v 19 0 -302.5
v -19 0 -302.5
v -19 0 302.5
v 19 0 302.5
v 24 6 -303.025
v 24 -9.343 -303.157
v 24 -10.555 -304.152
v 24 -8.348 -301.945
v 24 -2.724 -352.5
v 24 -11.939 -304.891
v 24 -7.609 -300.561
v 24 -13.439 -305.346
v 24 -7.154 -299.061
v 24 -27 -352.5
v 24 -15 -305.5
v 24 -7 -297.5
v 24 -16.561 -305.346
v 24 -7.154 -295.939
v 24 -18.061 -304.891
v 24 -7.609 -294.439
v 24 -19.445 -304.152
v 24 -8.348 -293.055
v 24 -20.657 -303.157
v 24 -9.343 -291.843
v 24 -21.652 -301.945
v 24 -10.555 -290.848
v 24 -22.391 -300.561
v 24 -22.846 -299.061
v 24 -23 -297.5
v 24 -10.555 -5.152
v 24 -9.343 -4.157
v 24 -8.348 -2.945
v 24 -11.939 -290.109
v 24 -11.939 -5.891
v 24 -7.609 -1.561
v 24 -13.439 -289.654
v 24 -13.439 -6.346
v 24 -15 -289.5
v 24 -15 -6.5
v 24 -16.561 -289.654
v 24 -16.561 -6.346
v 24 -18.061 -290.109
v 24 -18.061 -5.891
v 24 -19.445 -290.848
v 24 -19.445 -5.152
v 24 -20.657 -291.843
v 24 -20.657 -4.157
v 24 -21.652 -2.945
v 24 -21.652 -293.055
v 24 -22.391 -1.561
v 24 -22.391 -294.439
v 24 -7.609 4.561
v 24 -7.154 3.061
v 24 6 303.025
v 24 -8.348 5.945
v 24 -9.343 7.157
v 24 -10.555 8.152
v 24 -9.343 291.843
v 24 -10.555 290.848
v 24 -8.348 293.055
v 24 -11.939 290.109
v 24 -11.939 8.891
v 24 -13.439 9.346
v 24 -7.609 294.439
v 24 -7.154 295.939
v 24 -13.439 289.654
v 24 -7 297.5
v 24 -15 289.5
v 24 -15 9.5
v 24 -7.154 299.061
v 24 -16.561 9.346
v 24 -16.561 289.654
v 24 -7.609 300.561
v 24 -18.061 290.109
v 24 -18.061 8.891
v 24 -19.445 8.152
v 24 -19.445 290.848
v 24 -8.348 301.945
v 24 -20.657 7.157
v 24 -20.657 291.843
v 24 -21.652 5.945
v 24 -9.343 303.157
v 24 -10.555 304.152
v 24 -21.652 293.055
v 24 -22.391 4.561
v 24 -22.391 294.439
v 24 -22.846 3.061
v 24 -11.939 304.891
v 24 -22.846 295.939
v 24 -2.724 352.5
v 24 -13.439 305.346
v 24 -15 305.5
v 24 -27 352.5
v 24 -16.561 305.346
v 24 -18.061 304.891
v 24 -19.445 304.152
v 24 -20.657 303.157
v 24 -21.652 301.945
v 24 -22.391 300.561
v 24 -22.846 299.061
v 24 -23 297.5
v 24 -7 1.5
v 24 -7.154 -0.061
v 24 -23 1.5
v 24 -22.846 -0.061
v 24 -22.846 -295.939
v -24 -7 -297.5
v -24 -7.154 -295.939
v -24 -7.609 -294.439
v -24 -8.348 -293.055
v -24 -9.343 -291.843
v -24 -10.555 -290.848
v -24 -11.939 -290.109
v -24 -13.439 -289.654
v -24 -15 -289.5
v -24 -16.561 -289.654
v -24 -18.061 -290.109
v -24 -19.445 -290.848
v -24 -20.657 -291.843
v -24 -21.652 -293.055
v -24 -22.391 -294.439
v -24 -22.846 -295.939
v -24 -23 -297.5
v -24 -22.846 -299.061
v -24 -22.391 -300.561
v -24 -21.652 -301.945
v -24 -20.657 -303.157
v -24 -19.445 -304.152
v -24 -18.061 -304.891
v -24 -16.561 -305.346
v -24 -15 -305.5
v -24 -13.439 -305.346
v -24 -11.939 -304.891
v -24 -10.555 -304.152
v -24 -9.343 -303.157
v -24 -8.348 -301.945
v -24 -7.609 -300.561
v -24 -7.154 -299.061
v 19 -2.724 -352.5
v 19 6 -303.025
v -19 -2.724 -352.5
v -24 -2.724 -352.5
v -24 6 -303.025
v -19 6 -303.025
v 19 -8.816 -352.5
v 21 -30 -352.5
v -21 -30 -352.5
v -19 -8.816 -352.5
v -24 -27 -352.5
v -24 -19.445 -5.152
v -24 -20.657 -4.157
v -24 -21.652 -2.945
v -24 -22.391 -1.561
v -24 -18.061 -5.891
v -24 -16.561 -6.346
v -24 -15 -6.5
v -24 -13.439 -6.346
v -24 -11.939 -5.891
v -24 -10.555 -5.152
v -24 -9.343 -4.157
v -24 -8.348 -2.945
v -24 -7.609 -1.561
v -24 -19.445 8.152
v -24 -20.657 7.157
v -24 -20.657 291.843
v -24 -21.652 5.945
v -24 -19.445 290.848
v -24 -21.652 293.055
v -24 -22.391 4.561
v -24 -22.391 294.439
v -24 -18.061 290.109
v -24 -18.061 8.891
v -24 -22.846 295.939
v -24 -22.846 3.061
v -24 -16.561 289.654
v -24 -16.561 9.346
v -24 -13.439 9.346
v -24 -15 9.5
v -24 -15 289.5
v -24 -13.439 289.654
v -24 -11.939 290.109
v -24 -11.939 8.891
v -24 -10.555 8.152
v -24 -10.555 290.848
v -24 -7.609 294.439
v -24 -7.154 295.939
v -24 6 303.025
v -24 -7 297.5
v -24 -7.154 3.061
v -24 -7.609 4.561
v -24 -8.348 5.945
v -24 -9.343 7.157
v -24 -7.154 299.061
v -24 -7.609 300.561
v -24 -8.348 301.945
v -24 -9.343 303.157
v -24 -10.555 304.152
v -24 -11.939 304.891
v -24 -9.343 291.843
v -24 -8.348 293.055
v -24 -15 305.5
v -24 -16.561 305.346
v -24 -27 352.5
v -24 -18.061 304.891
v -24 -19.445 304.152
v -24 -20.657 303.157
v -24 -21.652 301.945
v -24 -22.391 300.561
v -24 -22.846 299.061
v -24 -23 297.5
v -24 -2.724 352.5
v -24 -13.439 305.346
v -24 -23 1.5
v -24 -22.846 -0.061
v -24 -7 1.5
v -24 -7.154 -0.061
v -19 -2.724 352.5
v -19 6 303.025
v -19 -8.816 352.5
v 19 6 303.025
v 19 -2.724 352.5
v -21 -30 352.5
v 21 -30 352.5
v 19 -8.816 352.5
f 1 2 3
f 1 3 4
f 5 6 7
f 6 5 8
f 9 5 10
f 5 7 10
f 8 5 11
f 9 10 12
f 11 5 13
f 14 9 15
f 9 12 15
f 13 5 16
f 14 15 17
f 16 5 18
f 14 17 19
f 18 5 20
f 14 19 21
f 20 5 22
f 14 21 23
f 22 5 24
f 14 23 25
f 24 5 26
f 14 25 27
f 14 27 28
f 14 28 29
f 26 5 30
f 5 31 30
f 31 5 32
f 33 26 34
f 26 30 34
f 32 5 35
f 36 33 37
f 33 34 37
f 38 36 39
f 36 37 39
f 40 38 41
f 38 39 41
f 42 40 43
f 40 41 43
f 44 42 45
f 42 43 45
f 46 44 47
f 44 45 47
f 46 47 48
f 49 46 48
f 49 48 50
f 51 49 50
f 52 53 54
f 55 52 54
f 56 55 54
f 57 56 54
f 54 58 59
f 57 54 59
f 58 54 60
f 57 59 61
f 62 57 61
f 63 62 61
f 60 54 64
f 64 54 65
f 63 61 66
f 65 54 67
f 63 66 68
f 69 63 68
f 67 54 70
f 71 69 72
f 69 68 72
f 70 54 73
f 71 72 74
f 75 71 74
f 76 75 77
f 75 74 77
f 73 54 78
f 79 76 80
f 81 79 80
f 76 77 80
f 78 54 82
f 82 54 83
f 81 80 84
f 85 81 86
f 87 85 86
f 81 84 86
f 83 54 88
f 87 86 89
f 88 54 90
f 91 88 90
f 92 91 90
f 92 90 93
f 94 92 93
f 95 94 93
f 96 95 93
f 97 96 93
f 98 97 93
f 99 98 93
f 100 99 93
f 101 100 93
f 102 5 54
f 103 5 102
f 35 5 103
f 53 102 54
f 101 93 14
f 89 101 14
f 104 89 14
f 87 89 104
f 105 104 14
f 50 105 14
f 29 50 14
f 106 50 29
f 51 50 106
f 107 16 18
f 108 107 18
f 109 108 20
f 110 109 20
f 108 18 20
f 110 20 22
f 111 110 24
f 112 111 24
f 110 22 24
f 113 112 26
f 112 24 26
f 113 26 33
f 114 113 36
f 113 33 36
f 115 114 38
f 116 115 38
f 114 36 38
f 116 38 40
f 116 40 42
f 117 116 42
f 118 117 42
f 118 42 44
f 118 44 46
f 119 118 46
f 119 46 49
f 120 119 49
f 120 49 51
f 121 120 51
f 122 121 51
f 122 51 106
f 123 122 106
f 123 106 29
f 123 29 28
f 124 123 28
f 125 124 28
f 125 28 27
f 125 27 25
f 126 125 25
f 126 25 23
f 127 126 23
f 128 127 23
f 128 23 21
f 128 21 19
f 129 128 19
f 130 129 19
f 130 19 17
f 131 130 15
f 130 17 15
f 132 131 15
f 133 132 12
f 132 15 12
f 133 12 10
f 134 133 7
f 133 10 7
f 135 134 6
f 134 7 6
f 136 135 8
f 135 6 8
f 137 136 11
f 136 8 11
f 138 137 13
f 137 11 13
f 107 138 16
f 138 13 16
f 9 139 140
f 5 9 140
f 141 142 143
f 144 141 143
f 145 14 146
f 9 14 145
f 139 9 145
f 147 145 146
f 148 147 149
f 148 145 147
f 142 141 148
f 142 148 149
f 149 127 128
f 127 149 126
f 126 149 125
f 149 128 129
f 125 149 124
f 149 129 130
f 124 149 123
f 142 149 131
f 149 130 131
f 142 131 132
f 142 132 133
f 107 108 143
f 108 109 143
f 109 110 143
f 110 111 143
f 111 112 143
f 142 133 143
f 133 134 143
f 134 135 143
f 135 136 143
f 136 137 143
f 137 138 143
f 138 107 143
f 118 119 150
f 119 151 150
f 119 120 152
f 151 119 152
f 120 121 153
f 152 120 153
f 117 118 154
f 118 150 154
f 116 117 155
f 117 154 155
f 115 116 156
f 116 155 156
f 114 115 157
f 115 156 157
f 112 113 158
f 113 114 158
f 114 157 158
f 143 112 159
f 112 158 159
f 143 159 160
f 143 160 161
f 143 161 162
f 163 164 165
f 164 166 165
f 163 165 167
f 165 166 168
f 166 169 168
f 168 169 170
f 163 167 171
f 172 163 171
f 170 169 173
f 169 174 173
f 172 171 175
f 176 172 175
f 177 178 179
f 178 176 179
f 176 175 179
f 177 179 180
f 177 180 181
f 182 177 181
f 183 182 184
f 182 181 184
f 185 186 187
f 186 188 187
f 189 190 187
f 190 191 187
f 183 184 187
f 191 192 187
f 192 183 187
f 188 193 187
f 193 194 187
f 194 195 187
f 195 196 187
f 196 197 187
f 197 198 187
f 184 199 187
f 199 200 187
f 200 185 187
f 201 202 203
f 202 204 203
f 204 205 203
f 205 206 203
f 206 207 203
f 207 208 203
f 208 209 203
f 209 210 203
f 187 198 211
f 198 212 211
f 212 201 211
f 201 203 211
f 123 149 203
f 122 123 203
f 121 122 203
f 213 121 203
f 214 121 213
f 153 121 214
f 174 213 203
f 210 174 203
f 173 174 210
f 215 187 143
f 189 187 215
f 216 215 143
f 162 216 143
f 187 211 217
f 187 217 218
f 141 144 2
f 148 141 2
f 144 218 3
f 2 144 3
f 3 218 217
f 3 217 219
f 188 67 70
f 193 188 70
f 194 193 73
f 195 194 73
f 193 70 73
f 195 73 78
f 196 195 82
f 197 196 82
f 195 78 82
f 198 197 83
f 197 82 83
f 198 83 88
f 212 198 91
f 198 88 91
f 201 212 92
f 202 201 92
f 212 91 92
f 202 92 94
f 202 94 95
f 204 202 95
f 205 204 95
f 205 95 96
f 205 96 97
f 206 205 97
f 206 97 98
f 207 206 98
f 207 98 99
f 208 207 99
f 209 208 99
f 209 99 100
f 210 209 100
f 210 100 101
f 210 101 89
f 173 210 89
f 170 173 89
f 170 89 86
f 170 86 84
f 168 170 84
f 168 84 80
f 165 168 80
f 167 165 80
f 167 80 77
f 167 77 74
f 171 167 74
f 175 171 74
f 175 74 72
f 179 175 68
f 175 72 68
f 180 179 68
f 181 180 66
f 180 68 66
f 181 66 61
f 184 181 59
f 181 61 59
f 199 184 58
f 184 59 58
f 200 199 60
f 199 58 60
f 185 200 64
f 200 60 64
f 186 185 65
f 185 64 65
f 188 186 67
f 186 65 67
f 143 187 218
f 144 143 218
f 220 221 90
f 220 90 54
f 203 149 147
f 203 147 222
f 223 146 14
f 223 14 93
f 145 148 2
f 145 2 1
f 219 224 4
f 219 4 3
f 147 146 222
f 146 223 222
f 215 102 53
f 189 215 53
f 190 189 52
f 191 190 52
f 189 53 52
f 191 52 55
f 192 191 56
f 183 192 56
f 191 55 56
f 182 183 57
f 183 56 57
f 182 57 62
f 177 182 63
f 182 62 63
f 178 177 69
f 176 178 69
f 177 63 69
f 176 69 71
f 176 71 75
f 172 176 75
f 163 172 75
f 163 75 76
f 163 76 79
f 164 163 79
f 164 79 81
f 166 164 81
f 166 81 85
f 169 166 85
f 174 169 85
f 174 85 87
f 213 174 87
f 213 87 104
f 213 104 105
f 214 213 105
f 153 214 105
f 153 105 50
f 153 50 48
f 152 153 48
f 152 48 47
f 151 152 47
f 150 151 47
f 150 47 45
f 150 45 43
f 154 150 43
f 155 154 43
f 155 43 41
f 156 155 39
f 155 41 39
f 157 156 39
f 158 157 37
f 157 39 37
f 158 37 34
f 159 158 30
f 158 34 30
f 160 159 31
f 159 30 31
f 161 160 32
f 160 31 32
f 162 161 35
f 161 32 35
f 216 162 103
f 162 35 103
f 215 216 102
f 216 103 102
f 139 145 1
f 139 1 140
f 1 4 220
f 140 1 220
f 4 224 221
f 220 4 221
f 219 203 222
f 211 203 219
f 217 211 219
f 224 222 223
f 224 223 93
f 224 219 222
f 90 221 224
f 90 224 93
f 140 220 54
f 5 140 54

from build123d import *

# Parameters (mm, degrees)
RESSALTO_EXTRUS_O1_DEPTH = 327.5
ESBO_O2_R                = 8
CORTE_EXTRUS_O1_DEPTH    = 655
RESSALTO_EXTRUS_O2_DEPTH = 25
RESSALTO_EXTRUS_O3_DEPTH = 25
CHANFRO1_SIZE            = 50
CHANFRO1_SIZE2           = 8.816349035
CORTE_EXTRUS_O2_START    = -48
CORTE_EXTRUS_O2_DEPTH    = 48
CHANFRO2_SIZE            = 3


with BuildPart() as part:
    # Esboço1 → Ressalto-extrusão1 (new, symmetric)
    with BuildSketch(Plane.XY):
        Polygon((-19, 0), (19, 0), (19, 6), (24, 6), (24, -30), (-24, -30), (-24, 6), (-19, 6), align=None)
    extrude(amount=RESSALTO_EXTRUS_O1_DEPTH, both=True)

    # Esboço2 → Corte-extrusão1 (cut)
    with BuildSketch(Plane(origin=(24, 0, 0), x_dir=(0, 0, -1), z_dir=(1, 0, 0))):
        with Locations(Location((-297.5, -15, 0), (0, 0, 90))):
            Circle(ESBO_O2_R)
        with Locations(Location((297.5, -15, 0), (0, 0, 90))):
            Circle(ESBO_O2_R)
        with Locations(Location((-1.5, -15, 0), (0, 0, 90))):
            Circle(ESBO_O2_R)
    extrude(amount=-CORTE_EXTRUS_O1_DEPTH, mode=Mode.SUBTRACT)

    # Esboço3 → Ressalto-extrusão2 (add)
    with BuildSketch(Plane.XY.offset(327.5)):
        Polygon((-24, 6), (-24, -30), (24, -30), (24, 6), (19, 6), (19, 0), (-19, 0), (-19, 6), align=None)
    extrude(amount=RESSALTO_EXTRUS_O2_DEPTH)

    # Esboço4 → Ressalto-extrusão3 (add)
    with BuildSketch(Plane(origin=(0, 0, -327.5), x_dir=(-1, 0, 0), z_dir=(0, 0, -1))):
        Polygon((24, -30), (24, 6), (19, 6), (19, 0), (-19, 0), (-19, 6), (-24, 6), (-24, -30), align=None)
    extrude(amount=RESSALTO_EXTRUS_O3_DEPTH)

    # Chanfro1
    chanfro1_edges = [part.edges().sort_by_distance(p)[0] for p in [
        (0, 0, 352.5),
        (0, 0, -352.5),
    ]]
    chanfro1_side = [part.faces().sort_by_distance(p)[0] for p in [
        (0, 0, 0),
    ]]
    chamfer(chanfro1_edges, length=CHANFRO1_SIZE, length2=CHANFRO1_SIZE2, reference=chanfro1_side[0])

    # Esboço5 → Corte-extrusão2 (cut)
    with BuildSketch(Plane(origin=(24, 0, 0), x_dir=(0, 0, -1), z_dir=(1, 0, 0)).offset(CORTE_EXTRUS_O2_START)):
        Polygon((-352.5, -2.723789364), (-303.024931981, 6), (-352.5, 6), align=None)
        Polygon((352.5, 6), (352.5, -2.723789364), (303.024931981, 6), align=None)
    extrude(amount=CORTE_EXTRUS_O2_DEPTH, mode=Mode.SUBTRACT)

    # Chanfro2
    chanfro2_edges = [part.edges().sort_by_distance(p)[0] for p in [
        (24, -30, 0),
        (-24, -30, 0),
    ]]
    chamfer(chanfro2_edges, length=CHANFRO2_SIZE)


solid = part.part
